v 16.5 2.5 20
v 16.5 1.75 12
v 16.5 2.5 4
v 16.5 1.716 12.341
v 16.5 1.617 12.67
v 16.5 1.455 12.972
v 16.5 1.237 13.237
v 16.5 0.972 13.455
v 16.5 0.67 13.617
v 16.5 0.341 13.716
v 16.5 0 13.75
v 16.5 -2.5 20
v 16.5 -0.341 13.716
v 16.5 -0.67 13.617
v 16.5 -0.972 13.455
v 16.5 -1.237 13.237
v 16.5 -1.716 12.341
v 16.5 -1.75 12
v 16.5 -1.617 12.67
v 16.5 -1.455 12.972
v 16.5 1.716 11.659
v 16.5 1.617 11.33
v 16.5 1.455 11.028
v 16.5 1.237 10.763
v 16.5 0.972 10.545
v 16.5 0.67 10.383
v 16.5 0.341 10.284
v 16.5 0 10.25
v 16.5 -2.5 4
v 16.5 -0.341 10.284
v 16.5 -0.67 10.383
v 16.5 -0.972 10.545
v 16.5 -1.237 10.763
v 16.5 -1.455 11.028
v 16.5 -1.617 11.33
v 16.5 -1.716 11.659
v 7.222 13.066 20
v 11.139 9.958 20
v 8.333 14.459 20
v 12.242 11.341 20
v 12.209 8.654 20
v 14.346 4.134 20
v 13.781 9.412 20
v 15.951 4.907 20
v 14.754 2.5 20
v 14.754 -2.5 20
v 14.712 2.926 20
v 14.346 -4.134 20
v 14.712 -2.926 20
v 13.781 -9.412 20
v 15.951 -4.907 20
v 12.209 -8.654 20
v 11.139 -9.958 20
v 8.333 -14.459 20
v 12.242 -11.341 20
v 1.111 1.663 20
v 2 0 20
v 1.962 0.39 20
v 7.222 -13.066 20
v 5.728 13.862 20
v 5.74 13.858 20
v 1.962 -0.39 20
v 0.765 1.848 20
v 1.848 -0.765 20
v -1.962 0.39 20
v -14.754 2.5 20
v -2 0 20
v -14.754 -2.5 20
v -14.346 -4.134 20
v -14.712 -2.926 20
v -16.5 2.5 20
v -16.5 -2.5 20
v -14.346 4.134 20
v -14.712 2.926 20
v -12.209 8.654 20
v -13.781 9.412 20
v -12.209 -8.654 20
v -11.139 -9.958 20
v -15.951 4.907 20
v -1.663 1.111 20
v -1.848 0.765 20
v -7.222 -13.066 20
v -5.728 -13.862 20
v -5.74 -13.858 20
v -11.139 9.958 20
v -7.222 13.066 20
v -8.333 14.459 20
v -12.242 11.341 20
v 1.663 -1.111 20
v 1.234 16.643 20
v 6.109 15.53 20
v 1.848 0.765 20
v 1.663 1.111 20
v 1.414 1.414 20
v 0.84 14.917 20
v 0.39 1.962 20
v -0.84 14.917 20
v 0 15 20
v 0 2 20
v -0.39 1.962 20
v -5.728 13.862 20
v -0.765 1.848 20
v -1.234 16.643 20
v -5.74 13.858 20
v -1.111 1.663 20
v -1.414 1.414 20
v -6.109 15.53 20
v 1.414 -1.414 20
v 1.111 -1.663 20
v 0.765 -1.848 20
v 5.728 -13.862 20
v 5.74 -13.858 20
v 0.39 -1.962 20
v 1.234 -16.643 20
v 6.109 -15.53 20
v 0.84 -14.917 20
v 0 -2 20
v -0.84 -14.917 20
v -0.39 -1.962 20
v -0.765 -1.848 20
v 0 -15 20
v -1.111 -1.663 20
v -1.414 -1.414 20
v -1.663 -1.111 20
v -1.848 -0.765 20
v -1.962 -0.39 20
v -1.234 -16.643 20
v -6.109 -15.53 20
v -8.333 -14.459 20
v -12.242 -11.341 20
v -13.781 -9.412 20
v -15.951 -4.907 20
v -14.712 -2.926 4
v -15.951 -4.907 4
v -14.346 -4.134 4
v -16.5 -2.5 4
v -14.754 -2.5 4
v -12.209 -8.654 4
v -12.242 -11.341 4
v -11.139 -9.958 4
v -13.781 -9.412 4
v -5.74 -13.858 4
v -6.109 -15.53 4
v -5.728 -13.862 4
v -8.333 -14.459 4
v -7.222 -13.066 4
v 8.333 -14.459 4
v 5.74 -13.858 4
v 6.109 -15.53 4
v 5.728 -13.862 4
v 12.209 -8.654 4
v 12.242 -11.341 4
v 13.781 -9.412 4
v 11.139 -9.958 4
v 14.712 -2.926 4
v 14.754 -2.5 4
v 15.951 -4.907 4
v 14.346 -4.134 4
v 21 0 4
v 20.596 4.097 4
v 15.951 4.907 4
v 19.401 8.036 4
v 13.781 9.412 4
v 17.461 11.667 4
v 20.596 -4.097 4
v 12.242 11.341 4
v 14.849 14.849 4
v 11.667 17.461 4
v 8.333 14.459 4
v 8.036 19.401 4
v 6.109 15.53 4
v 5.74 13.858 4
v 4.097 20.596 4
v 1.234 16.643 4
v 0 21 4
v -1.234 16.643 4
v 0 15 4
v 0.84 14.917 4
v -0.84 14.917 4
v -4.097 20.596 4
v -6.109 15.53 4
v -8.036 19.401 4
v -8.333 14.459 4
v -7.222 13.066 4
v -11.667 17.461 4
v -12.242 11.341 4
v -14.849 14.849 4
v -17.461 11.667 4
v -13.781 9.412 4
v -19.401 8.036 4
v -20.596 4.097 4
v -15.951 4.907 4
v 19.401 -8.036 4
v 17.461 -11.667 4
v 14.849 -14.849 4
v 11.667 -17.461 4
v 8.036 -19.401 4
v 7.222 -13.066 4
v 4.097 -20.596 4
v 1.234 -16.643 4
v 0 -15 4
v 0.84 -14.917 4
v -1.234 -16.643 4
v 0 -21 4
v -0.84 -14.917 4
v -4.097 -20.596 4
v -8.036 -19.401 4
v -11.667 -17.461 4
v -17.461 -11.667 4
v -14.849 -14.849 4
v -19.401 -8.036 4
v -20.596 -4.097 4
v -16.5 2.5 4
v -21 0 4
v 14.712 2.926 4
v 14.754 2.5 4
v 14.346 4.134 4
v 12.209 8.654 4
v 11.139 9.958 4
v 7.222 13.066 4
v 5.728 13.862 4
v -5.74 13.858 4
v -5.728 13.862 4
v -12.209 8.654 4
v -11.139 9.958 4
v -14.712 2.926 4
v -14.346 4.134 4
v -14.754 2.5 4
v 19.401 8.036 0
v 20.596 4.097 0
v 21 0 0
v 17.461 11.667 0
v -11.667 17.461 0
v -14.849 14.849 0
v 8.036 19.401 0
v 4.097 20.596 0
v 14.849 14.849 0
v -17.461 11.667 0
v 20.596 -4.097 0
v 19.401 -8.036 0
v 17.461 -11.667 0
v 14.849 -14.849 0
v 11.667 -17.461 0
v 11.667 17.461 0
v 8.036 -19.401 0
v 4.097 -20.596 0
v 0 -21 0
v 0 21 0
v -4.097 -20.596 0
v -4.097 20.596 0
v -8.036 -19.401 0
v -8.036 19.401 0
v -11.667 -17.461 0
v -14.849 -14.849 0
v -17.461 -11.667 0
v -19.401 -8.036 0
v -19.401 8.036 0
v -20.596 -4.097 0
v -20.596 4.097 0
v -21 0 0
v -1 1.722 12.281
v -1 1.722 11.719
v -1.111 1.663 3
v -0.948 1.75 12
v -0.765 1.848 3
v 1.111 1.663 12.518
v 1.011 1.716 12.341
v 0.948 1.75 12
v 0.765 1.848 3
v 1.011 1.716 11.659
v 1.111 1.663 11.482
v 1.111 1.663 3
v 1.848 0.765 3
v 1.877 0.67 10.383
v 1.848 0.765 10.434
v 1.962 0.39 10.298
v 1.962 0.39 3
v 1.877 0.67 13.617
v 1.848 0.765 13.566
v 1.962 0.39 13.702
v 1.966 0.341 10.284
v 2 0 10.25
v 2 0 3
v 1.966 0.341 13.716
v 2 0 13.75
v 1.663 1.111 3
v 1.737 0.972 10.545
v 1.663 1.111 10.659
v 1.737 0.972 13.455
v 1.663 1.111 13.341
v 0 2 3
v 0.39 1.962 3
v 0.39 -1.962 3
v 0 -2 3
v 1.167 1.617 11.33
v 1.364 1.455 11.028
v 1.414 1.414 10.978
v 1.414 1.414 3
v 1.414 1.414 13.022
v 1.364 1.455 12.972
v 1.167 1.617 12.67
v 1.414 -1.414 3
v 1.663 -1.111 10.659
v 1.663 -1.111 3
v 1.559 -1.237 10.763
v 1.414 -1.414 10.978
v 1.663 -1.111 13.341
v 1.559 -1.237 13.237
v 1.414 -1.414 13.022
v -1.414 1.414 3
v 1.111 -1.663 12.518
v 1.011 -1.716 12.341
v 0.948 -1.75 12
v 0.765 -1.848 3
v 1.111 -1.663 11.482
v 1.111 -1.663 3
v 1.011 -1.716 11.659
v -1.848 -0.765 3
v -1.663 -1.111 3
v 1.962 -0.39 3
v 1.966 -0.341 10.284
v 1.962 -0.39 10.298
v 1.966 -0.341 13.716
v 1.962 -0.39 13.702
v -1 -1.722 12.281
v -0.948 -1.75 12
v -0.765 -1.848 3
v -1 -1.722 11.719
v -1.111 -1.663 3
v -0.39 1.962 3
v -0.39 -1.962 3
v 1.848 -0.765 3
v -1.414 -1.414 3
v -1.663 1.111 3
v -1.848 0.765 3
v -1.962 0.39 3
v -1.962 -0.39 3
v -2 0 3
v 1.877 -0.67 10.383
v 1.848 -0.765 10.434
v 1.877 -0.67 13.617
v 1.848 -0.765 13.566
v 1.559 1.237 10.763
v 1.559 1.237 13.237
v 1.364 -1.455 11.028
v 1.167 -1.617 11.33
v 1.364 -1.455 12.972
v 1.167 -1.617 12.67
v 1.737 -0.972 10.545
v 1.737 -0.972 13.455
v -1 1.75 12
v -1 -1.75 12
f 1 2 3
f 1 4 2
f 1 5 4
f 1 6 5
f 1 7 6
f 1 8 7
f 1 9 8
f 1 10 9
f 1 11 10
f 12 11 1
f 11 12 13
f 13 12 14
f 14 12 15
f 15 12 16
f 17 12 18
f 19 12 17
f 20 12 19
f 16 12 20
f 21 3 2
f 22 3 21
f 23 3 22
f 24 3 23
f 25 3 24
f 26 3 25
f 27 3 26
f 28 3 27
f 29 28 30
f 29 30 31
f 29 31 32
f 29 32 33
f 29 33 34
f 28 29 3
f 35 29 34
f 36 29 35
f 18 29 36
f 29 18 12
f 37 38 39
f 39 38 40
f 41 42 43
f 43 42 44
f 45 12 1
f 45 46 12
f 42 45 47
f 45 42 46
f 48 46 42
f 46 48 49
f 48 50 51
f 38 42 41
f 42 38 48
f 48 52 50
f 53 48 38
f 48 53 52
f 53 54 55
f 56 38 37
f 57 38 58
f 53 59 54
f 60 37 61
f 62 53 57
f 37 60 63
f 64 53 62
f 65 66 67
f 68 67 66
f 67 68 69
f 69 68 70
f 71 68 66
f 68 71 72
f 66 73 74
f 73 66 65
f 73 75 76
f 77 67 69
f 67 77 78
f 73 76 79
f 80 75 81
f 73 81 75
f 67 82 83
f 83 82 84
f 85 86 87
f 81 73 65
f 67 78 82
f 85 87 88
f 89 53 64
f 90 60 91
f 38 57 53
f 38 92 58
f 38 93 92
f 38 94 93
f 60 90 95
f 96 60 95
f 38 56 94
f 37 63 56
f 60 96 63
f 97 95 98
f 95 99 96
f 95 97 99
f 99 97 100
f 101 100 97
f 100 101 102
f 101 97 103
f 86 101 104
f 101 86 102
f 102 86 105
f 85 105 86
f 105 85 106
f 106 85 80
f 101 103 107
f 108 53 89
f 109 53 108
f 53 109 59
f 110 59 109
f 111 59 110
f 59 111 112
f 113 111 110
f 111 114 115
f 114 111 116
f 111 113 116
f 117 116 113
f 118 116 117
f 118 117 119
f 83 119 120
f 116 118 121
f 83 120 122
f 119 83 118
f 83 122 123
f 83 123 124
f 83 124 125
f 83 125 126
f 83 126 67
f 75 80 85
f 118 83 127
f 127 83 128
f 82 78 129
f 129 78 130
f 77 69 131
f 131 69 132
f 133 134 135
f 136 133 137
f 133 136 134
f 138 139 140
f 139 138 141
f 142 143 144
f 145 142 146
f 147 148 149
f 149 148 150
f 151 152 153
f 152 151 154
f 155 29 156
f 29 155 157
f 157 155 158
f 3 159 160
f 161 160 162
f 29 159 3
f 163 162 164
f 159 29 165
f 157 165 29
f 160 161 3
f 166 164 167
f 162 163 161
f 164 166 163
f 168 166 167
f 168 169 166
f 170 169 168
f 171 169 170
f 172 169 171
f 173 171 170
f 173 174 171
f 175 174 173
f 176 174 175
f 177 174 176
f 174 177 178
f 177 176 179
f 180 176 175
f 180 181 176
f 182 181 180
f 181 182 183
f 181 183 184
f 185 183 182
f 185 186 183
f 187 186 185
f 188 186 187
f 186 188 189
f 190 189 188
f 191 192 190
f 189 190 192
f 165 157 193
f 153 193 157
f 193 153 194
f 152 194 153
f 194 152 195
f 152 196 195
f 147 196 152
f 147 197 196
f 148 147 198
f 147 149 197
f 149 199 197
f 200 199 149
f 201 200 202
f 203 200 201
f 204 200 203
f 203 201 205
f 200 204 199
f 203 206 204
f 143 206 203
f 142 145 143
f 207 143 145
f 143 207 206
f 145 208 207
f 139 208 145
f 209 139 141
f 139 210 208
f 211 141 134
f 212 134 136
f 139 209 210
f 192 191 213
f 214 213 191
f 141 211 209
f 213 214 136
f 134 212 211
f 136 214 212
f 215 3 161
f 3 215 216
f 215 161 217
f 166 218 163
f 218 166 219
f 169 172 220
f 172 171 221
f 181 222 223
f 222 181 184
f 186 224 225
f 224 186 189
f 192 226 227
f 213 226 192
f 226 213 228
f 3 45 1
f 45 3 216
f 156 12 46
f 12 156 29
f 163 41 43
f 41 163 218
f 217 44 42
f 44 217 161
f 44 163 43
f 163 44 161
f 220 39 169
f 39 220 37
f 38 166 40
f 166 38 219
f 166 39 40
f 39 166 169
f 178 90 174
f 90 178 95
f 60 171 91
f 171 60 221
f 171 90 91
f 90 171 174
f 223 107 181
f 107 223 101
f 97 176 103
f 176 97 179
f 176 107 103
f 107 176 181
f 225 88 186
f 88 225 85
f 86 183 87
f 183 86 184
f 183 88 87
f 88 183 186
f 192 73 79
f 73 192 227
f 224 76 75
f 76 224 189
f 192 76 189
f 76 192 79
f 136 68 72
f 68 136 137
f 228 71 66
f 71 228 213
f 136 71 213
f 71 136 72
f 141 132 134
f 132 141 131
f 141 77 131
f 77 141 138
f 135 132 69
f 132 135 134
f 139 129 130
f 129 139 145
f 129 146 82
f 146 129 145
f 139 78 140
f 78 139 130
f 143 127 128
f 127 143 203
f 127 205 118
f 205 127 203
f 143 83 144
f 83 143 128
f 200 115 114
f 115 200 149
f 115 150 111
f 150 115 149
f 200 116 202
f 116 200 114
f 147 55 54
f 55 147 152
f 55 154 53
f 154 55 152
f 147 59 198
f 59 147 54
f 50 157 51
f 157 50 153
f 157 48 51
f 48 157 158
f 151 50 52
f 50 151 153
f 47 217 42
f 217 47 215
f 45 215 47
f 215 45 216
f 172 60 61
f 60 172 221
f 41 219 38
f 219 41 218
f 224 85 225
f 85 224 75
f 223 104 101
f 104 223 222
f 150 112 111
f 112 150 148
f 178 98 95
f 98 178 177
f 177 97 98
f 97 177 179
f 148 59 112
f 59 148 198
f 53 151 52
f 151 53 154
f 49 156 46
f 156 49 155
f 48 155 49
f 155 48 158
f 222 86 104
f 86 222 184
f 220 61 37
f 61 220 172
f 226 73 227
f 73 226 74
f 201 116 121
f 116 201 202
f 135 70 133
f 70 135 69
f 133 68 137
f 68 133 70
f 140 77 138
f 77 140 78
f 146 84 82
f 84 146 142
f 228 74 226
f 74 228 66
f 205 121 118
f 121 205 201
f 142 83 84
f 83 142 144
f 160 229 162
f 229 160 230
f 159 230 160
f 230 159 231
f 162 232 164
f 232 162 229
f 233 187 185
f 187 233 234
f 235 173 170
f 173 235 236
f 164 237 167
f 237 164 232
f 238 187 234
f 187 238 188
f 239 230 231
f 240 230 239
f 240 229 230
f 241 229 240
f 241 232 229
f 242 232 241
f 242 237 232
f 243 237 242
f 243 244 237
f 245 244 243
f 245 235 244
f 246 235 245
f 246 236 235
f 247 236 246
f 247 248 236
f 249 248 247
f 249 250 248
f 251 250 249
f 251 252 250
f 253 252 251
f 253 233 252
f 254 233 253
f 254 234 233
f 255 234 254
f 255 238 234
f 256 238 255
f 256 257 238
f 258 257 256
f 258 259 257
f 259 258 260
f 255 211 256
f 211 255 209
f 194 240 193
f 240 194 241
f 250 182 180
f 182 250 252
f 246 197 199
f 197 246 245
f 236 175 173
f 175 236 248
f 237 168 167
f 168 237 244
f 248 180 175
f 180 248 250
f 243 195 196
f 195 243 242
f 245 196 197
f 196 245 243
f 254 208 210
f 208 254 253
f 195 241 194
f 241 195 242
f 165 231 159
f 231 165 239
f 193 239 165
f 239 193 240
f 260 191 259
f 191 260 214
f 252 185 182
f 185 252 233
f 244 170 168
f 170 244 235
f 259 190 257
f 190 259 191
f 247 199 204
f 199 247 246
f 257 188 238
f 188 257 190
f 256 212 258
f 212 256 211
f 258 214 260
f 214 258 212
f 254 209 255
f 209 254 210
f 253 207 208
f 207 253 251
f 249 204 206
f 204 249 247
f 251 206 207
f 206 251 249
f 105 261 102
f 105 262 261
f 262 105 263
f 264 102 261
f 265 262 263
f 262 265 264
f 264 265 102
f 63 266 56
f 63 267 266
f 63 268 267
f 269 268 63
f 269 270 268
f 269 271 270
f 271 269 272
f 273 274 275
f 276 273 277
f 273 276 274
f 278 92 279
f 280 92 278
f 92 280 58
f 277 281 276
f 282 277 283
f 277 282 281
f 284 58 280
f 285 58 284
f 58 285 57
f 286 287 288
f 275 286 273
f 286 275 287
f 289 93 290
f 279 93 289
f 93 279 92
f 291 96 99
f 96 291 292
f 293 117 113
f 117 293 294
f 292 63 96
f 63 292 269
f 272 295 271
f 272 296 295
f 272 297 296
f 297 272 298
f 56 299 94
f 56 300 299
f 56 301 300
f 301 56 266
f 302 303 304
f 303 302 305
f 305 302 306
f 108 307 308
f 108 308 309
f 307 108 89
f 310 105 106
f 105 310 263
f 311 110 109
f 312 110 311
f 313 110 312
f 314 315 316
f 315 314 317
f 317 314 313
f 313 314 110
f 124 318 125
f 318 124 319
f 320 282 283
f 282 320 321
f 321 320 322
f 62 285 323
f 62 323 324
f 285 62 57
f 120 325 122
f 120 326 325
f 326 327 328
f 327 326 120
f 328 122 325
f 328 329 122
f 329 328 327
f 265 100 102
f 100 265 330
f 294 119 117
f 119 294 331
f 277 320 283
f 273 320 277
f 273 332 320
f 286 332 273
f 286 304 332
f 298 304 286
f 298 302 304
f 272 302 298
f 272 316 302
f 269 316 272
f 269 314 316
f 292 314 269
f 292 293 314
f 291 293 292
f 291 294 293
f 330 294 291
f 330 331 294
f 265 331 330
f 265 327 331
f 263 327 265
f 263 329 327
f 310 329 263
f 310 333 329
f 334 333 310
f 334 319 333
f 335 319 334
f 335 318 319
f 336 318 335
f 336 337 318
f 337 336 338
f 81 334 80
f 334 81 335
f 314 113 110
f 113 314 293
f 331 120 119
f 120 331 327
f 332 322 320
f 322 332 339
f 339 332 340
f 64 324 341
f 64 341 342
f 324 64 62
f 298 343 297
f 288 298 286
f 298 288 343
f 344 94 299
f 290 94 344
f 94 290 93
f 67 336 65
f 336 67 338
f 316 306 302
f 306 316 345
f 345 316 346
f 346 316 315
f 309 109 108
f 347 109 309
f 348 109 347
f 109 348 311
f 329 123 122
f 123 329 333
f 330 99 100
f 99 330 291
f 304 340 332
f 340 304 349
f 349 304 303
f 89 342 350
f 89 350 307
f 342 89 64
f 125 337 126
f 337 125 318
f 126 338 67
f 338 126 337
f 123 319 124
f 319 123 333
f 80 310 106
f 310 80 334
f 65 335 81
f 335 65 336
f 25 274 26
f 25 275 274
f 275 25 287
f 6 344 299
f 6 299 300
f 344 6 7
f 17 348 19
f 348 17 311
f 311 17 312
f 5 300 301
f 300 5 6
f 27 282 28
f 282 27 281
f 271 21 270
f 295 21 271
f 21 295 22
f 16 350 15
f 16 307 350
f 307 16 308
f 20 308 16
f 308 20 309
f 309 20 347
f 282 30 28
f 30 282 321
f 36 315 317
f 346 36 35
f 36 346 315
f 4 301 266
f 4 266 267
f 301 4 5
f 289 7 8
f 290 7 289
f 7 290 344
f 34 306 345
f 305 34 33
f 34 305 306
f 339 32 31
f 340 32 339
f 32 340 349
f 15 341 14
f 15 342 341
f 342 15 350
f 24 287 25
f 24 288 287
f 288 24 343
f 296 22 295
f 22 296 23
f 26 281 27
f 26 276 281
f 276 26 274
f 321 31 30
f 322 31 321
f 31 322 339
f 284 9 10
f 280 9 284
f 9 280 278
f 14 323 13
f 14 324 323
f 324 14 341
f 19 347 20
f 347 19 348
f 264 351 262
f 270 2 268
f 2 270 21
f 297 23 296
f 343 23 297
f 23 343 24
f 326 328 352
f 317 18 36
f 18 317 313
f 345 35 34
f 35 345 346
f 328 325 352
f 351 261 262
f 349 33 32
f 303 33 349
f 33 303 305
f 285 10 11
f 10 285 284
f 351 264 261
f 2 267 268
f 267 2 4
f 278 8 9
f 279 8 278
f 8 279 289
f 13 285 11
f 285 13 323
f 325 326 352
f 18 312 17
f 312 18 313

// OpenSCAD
$fn = 32;

// ----------------------------------------------------------------------
// Control knob: skirt knob with grip ribs
// ----------------------------------------------------------------------

// --- parameters (mm) ---
skirt_d = 42;             // skirt diameter
skirt_t = 4;              // skirt thickness
rib_w = 5;                // grip rib width
rib_out = 2.5;            // grip rib radial protrusion
n_ribs = 14;              // number of grip ribs
knob_d = 30;              // knob body diameter
knob_h = 16;              // knob body height
bore_d = 4;               // shaft bore diameter
set_d = 3.5;              // set screw bore diameter

rib_step = 360 / n_ribs;  // rib angular step
total_h = skirt_t + knob_h;  // overall height

difference() {
  union() {
    translate([0, 0, skirt_t]) cylinder(h = knob_h, d = knob_d);
    cylinder(h = skirt_t, d = skirt_d);
    for (i = [0 : n_ribs - 1])
      rotate([0, 0, i * rib_step])
        translate([knob_d / 2 - 1, -rib_w / 2, skirt_t])
          cube([rib_out, rib_w, knob_h]);
  }
  translate([0, 0, skirt_t - 1]) cylinder(h = knob_h + 2, d = bore_d);
  translate([-1, 0, skirt_t + knob_h / 2]) rotate([0, 90, 0])
    cylinder(h = knob_d / 2 + bore_d / 2 + 2, d = set_d);
}
